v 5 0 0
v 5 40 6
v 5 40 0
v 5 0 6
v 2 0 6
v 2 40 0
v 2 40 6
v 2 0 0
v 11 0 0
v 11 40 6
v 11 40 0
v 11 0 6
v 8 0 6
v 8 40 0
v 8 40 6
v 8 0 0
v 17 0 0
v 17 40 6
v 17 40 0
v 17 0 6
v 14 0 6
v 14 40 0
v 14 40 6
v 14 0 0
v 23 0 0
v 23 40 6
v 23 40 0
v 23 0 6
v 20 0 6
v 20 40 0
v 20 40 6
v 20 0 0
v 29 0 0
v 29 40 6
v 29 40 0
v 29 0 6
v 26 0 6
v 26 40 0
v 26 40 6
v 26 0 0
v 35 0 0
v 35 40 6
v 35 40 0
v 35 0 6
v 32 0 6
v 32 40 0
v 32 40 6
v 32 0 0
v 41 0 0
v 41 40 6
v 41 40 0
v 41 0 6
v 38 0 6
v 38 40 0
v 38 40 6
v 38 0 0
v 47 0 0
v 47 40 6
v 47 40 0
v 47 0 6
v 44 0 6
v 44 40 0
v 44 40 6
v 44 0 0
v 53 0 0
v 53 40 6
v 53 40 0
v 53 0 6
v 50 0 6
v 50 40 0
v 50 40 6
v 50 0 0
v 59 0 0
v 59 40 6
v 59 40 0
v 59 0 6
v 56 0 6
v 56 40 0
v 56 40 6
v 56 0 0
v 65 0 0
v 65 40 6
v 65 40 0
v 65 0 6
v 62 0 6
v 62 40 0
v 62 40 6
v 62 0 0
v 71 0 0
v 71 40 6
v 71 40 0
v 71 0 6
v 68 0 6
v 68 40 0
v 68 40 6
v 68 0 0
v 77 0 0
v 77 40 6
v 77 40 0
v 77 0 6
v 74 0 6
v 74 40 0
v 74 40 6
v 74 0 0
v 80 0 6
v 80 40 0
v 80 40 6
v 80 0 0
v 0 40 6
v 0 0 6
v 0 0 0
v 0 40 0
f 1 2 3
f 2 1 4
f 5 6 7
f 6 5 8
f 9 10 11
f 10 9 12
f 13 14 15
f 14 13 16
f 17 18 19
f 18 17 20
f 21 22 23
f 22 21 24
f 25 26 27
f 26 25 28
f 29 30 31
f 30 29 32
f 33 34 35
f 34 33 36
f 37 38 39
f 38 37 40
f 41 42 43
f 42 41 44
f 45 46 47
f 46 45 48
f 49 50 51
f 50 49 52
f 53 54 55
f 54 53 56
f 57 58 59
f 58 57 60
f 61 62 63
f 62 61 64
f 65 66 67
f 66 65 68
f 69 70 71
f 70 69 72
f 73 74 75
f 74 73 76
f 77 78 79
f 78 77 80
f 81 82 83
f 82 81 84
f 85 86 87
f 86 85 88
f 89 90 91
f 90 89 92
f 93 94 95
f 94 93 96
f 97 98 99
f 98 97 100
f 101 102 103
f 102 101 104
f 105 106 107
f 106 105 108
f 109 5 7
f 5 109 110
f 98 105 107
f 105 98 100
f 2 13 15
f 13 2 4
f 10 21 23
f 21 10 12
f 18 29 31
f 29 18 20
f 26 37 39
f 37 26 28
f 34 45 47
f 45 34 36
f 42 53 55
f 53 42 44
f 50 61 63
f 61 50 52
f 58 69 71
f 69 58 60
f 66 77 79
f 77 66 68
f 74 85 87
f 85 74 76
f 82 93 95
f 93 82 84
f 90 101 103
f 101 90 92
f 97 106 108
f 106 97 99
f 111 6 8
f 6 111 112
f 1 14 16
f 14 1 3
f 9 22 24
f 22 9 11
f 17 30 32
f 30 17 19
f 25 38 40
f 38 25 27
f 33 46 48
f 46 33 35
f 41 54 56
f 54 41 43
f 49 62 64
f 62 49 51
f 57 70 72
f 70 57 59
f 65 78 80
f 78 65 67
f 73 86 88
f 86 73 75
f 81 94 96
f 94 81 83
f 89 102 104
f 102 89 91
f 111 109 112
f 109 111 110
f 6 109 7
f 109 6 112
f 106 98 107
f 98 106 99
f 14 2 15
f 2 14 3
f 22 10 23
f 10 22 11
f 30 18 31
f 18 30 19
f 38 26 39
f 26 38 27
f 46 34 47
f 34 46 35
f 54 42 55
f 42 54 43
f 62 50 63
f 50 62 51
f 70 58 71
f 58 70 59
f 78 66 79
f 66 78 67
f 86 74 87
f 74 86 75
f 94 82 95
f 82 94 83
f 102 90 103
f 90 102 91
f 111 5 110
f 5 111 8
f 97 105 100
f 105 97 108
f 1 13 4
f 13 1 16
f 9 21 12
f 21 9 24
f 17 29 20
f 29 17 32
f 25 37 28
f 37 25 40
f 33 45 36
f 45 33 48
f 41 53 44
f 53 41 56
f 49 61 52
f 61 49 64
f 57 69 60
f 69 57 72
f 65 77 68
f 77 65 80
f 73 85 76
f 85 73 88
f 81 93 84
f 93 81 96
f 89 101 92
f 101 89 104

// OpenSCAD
module diagonal_grill(
    width, length, height,
    size = 2,
    angle = 45
) {
    e = 0.0049;
    plot_width = size * 2;

    long_side = max(width, length);

    module _cavities() {
        translate([width / 2, length / 2, 0 ]) {
            rotate([0, 0, angle]) {
                translate([-long_side, -long_side, 0]) {
                    for (i = [0 : long_side / plot_width * 2 - 1]) {
                        x = plot_width * i;
                        y = 0;

                        translate([x, y, -e]) {
                            cube([size, long_side * 2, height + e * 2]);
                        }
                    }
                }
            }
        }
    }

    difference() {
        cube([width, length, height]);
        _cavities();
    }
}

diagonal_grill(80, 40, 6, size = 3, angle = 360 * $t);
